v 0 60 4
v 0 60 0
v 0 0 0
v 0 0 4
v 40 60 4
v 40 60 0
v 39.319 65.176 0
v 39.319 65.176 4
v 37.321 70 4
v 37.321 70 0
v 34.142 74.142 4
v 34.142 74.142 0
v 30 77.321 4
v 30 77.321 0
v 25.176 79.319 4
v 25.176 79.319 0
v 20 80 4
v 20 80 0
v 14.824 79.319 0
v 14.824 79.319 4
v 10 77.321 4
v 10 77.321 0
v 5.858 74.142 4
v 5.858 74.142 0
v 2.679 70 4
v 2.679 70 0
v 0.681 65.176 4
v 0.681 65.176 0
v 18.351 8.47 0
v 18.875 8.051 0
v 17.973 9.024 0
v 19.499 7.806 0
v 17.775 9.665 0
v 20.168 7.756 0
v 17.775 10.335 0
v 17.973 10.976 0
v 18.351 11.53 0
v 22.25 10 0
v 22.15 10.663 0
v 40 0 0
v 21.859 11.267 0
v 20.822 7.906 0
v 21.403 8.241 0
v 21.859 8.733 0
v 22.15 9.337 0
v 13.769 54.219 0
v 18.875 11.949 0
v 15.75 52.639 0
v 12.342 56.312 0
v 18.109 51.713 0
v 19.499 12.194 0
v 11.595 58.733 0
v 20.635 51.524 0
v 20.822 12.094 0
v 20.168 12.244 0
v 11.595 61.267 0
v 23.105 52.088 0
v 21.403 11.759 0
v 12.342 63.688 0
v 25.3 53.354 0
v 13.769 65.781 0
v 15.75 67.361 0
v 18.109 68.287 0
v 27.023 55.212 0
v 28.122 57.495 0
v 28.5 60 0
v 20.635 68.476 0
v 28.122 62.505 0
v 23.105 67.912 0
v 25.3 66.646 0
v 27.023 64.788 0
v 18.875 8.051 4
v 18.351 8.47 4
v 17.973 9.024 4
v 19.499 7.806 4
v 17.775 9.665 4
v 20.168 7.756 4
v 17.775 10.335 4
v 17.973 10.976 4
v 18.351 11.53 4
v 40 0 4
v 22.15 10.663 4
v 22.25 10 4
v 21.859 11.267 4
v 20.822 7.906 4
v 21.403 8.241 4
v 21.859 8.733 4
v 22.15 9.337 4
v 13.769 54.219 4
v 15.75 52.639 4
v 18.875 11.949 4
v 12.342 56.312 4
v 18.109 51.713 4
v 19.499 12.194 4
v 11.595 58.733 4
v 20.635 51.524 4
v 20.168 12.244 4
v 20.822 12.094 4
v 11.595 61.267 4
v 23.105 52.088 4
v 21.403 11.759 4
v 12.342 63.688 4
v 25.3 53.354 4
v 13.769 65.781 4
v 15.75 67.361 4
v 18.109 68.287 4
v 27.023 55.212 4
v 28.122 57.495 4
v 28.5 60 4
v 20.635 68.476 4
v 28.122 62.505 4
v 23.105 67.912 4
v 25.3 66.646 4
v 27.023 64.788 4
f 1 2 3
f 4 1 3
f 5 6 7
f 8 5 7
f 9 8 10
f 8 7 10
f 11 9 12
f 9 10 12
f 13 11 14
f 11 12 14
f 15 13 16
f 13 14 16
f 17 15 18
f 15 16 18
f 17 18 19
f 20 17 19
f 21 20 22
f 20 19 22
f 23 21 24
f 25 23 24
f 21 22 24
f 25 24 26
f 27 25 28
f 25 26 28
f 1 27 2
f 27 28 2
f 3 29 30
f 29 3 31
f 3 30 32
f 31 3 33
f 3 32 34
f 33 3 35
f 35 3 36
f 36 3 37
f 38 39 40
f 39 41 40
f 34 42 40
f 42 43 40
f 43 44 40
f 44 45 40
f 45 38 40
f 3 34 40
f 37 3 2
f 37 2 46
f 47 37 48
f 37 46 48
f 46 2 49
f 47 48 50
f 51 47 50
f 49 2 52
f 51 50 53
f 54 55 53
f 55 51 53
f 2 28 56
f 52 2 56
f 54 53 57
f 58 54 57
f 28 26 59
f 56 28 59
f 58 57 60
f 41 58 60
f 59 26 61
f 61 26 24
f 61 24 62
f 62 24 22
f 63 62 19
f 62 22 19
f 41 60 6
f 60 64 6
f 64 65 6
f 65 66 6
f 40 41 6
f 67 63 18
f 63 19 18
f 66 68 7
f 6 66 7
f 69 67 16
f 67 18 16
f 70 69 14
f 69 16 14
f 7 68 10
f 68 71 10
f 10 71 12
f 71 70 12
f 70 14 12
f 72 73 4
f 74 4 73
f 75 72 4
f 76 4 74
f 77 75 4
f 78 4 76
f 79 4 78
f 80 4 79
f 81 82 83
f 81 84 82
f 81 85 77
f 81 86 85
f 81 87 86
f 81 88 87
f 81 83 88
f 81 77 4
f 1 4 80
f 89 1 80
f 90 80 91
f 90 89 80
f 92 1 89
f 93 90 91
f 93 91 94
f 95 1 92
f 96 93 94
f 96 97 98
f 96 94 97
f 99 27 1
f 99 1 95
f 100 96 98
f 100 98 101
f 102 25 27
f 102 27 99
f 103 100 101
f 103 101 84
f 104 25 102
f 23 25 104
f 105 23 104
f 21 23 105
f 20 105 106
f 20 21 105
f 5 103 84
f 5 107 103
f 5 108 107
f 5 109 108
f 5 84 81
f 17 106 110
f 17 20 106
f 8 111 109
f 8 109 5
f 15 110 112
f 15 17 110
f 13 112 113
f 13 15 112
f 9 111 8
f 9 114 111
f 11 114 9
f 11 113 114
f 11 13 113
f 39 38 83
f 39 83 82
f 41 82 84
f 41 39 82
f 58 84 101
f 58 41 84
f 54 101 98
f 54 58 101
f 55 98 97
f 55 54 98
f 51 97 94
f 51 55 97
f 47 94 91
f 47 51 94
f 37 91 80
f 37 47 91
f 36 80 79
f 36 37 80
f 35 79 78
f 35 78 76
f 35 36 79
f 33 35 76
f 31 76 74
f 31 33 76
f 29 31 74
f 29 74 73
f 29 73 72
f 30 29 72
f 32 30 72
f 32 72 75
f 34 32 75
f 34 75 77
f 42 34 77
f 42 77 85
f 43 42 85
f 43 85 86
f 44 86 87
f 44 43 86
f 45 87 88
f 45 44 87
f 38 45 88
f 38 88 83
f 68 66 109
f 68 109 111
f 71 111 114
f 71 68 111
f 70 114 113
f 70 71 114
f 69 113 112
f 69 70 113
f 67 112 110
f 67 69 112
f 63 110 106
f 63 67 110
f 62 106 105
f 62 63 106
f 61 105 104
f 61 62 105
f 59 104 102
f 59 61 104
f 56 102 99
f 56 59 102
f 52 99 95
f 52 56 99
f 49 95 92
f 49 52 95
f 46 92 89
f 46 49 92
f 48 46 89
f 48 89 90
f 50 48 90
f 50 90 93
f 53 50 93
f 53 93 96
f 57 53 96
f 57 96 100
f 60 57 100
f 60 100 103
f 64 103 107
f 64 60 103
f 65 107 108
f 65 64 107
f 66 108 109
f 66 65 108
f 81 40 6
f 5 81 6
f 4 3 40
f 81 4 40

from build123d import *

# Parameters (mm, degrees)
F0_R     = 2.25
F0_R_2   = 8.5
F1_DEPTH = 4


with BuildPart() as f1:
    # F0 (on Top) → F1 (new body)
    with BuildSketch(Plane.XY):
        with BuildLine():
            Line((0, 60), (0, 0))
            Line((0, 0), (40, 0))
            Line((40, 0), (40, 60))
            ThreePointArc((40, 60), (20, 40), (0, 60))
        make_face()
        with Locations((20, 10)):
            Circle(F0_R, mode=Mode.SUBTRACT)
        with BuildLine():
            ThreePointArc((20, 80), (5.857864, 74.142136), (0, 60))
            ThreePointArc((0, 60), (20, 40), (40, 60))
            ThreePointArc((40, 60), (34.142136, 74.142136), (20, 80))
        make_face()
        with Locations((20, 60)):
            Circle(F0_R_2, mode=Mode.SUBTRACT)
    extrude(amount=F1_DEPTH)


solid = f1.part
